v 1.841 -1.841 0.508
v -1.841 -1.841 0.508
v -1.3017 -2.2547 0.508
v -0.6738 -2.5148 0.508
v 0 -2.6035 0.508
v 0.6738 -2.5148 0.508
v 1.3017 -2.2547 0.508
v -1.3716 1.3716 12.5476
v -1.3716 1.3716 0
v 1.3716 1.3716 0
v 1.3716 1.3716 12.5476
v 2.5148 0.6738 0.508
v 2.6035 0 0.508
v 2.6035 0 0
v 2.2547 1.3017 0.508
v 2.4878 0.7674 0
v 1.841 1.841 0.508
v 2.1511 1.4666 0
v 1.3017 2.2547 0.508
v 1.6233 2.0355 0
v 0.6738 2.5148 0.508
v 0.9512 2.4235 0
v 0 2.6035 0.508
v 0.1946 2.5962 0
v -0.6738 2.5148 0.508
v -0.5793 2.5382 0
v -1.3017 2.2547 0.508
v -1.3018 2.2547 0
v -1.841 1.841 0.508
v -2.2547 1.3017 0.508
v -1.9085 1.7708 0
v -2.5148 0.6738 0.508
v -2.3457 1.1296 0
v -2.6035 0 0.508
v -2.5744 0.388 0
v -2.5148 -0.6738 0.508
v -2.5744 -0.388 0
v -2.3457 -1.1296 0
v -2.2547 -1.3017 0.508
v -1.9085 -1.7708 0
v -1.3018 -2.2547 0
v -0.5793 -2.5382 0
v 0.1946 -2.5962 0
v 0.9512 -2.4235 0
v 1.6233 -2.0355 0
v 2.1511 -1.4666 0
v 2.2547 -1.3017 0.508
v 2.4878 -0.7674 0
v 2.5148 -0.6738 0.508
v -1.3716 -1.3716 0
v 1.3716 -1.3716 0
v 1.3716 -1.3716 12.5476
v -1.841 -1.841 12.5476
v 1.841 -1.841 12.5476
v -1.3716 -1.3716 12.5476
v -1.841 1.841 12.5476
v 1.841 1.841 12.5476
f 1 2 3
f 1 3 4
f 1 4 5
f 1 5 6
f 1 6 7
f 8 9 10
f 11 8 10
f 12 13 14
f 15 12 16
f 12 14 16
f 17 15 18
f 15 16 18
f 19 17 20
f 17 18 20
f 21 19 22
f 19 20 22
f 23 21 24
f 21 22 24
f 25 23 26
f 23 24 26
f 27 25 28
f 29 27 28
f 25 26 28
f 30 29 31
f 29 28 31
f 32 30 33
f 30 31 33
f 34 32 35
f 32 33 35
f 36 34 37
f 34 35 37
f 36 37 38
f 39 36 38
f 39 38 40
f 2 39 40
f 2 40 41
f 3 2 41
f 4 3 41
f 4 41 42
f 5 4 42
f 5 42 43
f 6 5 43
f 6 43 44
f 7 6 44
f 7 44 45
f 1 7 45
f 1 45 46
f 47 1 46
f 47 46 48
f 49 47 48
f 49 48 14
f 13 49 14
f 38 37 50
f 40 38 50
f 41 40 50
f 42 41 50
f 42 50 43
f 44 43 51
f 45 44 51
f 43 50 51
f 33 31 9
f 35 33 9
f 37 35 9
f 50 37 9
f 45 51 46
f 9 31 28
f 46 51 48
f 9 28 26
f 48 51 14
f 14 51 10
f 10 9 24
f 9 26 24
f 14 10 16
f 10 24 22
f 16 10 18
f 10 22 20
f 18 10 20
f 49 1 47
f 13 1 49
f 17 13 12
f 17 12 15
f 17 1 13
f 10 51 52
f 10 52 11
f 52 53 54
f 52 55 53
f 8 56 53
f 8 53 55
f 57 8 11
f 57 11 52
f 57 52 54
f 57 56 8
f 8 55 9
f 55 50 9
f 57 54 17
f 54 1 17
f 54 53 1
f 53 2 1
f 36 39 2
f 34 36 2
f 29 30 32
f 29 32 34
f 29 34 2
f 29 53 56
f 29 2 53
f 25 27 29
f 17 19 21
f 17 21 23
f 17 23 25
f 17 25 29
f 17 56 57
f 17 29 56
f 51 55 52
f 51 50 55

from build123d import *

# Parameters (mm, degrees)
F0_R     = 2.6035
F0_W     = 2.7432
F0_H     = 2.7432
F1_DEPTH = 0.508
F2_W     = 3.681906
F2_H     = 3.681906
F2_W_2   = 2.7432
F2_H_2   = 2.7432
F3_DEPTH = 12.0396


with BuildPart() as f1:
    # F0 (on Top) → F1 (new body)
    with BuildSketch(Plane.XY):
        Circle(F0_R)
        Rectangle(F0_W, F0_H, mode=Mode.SUBTRACT)
    extrude(amount=F1_DEPTH)

    # F2 (on face) → F3 (join)
    with BuildSketch(Plane.XY.offset(0.508)):
        Rectangle(F2_W, F2_H)
        Rectangle(F2_W_2, F2_H_2, mode=Mode.SUBTRACT)
    extrude(amount=F3_DEPTH)


solid = f1.part
